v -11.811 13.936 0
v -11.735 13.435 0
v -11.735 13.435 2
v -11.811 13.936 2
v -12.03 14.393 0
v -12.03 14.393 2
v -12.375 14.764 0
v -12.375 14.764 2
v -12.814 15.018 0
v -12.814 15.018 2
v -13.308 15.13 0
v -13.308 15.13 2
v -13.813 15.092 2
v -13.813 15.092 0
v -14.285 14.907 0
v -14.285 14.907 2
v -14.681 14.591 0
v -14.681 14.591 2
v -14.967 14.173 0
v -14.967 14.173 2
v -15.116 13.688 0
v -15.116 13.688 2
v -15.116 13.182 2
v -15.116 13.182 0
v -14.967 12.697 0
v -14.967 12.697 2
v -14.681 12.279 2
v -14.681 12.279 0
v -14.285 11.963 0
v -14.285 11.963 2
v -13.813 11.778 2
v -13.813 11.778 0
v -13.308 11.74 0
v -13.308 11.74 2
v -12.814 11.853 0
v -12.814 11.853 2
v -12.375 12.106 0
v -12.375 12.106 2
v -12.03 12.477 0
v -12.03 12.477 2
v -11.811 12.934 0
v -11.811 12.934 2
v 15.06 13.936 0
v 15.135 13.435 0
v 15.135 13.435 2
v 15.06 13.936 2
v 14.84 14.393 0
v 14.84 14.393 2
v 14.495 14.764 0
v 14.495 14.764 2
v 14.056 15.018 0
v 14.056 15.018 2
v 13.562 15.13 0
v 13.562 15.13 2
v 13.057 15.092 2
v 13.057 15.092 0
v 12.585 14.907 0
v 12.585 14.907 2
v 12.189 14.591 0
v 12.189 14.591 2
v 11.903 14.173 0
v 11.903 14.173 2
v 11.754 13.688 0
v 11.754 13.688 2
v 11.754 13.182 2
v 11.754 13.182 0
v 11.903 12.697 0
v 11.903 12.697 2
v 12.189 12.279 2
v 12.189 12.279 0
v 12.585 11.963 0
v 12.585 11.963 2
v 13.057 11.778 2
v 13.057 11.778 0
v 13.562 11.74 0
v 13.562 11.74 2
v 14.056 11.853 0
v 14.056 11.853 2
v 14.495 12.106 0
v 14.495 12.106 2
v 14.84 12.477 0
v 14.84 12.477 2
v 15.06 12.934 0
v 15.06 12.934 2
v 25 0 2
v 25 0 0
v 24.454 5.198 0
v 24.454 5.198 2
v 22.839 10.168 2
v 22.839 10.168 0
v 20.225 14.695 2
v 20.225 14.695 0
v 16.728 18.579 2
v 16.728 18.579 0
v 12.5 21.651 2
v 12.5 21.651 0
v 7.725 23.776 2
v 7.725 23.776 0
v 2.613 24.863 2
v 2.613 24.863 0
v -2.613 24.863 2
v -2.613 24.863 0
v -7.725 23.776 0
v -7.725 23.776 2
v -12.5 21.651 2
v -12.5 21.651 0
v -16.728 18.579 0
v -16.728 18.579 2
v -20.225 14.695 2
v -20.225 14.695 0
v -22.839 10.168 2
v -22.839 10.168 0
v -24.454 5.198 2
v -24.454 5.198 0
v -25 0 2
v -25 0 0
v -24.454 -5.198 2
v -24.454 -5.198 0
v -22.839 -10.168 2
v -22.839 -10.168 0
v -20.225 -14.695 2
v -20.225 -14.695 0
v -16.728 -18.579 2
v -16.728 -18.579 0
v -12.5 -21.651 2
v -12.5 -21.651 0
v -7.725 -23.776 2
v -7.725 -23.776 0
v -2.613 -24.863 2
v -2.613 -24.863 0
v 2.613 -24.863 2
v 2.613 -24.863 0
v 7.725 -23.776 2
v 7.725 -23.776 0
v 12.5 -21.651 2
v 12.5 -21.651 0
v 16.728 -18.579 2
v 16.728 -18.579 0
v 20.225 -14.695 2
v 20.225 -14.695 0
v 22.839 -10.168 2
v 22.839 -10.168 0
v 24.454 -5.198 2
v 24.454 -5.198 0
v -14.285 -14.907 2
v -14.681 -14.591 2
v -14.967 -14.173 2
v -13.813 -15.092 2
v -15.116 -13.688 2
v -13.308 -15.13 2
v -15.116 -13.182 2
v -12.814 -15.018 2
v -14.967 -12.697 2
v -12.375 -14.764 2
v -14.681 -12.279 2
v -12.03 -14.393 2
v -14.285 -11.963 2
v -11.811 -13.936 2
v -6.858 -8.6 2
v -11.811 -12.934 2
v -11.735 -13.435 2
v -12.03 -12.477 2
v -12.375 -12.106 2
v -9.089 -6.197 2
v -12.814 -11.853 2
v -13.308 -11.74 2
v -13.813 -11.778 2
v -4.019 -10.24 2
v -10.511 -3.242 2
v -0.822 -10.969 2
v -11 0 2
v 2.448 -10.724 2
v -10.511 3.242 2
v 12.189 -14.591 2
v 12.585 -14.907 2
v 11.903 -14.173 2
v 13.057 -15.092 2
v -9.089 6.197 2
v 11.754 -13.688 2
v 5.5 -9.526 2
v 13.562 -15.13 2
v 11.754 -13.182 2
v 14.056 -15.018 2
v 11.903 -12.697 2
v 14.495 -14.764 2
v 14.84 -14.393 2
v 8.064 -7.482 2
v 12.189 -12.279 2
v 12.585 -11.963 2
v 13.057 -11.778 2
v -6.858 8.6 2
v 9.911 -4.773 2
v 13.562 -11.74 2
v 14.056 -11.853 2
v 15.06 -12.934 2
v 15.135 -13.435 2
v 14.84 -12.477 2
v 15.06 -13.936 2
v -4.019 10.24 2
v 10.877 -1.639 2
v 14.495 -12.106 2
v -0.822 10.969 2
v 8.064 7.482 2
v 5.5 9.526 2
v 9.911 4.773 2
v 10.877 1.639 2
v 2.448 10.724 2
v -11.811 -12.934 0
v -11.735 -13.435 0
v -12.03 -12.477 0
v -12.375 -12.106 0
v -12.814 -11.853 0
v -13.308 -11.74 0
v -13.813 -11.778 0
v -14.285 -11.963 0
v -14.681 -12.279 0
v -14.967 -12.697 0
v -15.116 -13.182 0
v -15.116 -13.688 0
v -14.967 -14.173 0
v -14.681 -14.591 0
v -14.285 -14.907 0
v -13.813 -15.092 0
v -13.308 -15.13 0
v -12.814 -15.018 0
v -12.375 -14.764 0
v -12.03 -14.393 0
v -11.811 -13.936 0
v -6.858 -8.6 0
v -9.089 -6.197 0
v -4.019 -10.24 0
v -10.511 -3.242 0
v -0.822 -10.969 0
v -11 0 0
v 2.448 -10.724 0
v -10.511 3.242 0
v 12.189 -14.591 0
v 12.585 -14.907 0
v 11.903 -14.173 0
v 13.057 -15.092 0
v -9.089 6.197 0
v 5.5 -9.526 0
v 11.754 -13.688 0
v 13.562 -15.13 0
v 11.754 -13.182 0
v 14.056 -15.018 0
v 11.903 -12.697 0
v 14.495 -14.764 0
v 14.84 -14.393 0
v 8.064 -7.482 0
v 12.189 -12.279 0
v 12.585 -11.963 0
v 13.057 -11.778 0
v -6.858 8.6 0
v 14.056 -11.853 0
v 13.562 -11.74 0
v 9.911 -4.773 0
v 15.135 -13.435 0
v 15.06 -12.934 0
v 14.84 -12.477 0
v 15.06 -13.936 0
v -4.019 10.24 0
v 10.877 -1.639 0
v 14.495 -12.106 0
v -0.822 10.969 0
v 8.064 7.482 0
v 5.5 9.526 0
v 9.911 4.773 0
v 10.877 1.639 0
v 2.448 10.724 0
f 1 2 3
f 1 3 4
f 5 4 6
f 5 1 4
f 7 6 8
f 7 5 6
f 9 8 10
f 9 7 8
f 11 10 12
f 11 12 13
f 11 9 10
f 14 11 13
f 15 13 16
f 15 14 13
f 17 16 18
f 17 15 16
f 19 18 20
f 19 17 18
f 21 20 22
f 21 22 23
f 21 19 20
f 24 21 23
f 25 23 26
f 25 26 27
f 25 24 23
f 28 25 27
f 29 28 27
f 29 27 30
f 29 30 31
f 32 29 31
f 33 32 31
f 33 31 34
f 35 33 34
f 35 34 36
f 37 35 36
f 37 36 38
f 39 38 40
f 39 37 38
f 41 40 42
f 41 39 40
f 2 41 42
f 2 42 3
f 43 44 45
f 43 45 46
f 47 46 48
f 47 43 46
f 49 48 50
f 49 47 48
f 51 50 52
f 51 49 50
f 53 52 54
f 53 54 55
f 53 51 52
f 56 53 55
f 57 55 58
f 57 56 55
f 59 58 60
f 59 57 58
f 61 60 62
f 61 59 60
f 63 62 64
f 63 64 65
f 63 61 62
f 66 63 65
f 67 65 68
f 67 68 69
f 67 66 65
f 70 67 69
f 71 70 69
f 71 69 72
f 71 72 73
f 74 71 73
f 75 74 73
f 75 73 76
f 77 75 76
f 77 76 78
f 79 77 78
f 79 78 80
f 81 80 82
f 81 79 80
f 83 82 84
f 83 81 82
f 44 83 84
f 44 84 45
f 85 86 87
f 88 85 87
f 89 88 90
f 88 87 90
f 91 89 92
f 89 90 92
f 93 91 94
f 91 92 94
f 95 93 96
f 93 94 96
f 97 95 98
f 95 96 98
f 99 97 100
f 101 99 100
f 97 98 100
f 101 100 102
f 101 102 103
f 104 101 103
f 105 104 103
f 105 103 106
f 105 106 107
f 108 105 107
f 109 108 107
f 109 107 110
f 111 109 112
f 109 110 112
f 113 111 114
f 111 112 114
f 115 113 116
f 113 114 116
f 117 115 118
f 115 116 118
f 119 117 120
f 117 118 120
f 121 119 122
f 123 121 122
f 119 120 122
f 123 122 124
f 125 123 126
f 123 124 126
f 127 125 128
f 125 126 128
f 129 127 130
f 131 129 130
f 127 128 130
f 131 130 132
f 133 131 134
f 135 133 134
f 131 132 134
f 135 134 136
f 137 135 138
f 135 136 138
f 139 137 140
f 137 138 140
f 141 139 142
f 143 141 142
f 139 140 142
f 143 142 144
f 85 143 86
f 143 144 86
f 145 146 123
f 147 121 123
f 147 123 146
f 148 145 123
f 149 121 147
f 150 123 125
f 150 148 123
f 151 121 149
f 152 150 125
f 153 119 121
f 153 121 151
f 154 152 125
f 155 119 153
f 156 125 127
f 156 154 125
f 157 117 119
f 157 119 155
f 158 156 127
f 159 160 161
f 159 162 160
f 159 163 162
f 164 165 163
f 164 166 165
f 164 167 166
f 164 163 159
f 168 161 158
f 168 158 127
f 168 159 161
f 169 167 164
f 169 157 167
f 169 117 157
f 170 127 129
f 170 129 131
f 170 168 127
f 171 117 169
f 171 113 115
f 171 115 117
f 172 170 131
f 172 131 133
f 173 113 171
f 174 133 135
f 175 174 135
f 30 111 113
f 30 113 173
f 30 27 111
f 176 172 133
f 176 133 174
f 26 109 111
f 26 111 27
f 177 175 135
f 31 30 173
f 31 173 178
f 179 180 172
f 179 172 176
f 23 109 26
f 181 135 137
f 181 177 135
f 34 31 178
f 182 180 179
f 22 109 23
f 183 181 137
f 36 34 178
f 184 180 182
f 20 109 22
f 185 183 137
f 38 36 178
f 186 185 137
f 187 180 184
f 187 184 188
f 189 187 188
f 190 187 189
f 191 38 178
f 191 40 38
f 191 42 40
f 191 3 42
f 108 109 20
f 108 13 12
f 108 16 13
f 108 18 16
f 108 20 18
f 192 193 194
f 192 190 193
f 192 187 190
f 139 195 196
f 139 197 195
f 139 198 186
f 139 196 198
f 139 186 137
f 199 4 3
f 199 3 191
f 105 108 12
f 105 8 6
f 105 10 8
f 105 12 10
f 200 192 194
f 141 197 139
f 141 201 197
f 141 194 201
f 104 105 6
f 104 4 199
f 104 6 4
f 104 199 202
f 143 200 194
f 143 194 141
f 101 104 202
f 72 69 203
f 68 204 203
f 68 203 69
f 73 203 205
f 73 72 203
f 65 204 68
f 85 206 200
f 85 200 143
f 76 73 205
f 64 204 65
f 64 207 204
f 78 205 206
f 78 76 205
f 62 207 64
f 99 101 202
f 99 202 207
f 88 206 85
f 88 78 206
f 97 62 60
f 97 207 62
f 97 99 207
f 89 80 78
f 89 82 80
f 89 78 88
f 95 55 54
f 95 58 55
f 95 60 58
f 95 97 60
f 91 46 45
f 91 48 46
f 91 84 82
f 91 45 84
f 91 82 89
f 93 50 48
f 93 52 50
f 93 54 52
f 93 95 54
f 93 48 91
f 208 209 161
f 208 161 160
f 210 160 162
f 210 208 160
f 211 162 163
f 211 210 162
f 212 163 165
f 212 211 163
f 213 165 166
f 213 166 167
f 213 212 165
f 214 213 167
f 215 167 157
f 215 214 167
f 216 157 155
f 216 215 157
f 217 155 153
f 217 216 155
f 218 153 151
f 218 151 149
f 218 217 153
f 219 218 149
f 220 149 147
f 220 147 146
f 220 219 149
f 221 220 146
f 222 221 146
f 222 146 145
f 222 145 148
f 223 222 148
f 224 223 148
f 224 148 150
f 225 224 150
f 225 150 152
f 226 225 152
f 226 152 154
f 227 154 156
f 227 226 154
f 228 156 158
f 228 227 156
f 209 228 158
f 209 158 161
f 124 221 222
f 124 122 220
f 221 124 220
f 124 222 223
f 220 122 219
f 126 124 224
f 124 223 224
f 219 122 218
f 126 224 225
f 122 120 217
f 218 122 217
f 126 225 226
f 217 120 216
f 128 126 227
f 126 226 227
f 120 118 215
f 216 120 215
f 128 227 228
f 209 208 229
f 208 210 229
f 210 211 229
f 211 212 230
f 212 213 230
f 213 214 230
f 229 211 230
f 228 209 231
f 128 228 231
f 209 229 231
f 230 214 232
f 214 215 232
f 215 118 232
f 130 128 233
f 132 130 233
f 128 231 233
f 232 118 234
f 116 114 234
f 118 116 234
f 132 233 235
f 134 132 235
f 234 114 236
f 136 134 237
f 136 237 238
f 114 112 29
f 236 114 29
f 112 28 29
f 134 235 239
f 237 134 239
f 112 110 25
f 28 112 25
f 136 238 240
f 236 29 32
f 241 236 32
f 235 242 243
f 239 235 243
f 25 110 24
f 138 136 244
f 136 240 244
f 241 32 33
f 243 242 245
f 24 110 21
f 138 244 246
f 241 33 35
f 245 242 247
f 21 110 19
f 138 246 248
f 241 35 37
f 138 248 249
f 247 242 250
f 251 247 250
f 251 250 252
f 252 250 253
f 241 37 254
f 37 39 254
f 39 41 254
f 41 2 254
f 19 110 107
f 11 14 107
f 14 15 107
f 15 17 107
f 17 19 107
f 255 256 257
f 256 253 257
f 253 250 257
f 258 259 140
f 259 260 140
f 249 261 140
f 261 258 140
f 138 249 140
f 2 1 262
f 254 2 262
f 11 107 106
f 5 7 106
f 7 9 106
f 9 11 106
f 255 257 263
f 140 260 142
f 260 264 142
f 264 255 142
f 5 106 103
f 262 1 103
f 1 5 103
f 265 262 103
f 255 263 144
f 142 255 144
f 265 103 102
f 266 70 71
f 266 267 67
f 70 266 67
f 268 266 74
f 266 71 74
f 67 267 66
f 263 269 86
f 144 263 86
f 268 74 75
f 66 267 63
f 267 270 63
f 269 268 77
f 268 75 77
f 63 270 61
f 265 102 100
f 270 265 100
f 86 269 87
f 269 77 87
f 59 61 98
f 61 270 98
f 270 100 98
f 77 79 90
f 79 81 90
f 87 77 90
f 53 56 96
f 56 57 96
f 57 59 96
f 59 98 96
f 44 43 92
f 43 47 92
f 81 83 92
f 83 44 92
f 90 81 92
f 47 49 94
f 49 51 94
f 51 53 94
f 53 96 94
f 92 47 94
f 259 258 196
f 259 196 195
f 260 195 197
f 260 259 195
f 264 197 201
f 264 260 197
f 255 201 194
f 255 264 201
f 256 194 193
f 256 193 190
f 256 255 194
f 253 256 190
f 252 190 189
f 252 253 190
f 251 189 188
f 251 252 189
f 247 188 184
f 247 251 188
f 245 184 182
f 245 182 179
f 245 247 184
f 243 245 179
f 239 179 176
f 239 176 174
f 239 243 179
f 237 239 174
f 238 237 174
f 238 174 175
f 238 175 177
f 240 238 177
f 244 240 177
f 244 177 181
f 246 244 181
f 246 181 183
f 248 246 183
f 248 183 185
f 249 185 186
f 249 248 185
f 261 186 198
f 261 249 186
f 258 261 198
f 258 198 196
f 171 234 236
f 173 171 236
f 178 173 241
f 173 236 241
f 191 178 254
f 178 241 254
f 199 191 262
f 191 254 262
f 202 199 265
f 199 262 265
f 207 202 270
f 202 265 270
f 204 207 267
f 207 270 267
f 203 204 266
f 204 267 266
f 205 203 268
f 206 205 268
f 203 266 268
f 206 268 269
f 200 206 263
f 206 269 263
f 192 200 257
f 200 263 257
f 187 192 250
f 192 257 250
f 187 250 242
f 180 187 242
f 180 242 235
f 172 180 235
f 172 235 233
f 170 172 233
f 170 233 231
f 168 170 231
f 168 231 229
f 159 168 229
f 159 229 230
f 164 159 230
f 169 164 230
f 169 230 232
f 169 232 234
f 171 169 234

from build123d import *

# Parameters (mm, degrees)
BOSS_EXTRU_1_DEPTH      = 2
BOSS_EXTRU_1_DEPTH_BACK = 0.0001
ESQUISSE1_R             = 25
ESQUISSE1_R_2           = 1.7
ESQUISSE2_R             = 11
ENL_V_MAT_EXTRU_1_DEPTH = 10


with BuildPart() as part:
    # Esquisse1 → Boss.-Extru.1 (new, two sides: drawn at the far end of the back side and taken through both)
    with BuildSketch(Plane.XY.offset(-BOSS_EXTRU_1_DEPTH_BACK)):
        Circle(ESQUISSE1_R)
        with Locations((-13.435028843, 13.435028843)):
            Circle(ESQUISSE1_R_2, mode=Mode.SUBTRACT)
        with Locations((13.435028843, 13.435028843)):
            Circle(ESQUISSE1_R_2, mode=Mode.SUBTRACT)
        with Locations((13.435028843, -13.435028843)):
            Circle(ESQUISSE1_R_2, mode=Mode.SUBTRACT)
        with Locations((-13.435028843, -13.435028843)):
            Circle(ESQUISSE1_R_2, mode=Mode.SUBTRACT)
    extrude(amount=BOSS_EXTRU_1_DEPTH + BOSS_EXTRU_1_DEPTH_BACK)

    # Esquisse2 → Enlèv. mat.-Extru.1 (cut)
    with BuildSketch(Plane(origin=(0, 0, -0.0001), x_dir=(-1, 0, 0), z_dir=(0, 0, -1))):
        Circle(ESQUISSE2_R)
    extrude(amount=-ENL_V_MAT_EXTRU_1_DEPTH, mode=Mode.SUBTRACT)


solid = part.part
